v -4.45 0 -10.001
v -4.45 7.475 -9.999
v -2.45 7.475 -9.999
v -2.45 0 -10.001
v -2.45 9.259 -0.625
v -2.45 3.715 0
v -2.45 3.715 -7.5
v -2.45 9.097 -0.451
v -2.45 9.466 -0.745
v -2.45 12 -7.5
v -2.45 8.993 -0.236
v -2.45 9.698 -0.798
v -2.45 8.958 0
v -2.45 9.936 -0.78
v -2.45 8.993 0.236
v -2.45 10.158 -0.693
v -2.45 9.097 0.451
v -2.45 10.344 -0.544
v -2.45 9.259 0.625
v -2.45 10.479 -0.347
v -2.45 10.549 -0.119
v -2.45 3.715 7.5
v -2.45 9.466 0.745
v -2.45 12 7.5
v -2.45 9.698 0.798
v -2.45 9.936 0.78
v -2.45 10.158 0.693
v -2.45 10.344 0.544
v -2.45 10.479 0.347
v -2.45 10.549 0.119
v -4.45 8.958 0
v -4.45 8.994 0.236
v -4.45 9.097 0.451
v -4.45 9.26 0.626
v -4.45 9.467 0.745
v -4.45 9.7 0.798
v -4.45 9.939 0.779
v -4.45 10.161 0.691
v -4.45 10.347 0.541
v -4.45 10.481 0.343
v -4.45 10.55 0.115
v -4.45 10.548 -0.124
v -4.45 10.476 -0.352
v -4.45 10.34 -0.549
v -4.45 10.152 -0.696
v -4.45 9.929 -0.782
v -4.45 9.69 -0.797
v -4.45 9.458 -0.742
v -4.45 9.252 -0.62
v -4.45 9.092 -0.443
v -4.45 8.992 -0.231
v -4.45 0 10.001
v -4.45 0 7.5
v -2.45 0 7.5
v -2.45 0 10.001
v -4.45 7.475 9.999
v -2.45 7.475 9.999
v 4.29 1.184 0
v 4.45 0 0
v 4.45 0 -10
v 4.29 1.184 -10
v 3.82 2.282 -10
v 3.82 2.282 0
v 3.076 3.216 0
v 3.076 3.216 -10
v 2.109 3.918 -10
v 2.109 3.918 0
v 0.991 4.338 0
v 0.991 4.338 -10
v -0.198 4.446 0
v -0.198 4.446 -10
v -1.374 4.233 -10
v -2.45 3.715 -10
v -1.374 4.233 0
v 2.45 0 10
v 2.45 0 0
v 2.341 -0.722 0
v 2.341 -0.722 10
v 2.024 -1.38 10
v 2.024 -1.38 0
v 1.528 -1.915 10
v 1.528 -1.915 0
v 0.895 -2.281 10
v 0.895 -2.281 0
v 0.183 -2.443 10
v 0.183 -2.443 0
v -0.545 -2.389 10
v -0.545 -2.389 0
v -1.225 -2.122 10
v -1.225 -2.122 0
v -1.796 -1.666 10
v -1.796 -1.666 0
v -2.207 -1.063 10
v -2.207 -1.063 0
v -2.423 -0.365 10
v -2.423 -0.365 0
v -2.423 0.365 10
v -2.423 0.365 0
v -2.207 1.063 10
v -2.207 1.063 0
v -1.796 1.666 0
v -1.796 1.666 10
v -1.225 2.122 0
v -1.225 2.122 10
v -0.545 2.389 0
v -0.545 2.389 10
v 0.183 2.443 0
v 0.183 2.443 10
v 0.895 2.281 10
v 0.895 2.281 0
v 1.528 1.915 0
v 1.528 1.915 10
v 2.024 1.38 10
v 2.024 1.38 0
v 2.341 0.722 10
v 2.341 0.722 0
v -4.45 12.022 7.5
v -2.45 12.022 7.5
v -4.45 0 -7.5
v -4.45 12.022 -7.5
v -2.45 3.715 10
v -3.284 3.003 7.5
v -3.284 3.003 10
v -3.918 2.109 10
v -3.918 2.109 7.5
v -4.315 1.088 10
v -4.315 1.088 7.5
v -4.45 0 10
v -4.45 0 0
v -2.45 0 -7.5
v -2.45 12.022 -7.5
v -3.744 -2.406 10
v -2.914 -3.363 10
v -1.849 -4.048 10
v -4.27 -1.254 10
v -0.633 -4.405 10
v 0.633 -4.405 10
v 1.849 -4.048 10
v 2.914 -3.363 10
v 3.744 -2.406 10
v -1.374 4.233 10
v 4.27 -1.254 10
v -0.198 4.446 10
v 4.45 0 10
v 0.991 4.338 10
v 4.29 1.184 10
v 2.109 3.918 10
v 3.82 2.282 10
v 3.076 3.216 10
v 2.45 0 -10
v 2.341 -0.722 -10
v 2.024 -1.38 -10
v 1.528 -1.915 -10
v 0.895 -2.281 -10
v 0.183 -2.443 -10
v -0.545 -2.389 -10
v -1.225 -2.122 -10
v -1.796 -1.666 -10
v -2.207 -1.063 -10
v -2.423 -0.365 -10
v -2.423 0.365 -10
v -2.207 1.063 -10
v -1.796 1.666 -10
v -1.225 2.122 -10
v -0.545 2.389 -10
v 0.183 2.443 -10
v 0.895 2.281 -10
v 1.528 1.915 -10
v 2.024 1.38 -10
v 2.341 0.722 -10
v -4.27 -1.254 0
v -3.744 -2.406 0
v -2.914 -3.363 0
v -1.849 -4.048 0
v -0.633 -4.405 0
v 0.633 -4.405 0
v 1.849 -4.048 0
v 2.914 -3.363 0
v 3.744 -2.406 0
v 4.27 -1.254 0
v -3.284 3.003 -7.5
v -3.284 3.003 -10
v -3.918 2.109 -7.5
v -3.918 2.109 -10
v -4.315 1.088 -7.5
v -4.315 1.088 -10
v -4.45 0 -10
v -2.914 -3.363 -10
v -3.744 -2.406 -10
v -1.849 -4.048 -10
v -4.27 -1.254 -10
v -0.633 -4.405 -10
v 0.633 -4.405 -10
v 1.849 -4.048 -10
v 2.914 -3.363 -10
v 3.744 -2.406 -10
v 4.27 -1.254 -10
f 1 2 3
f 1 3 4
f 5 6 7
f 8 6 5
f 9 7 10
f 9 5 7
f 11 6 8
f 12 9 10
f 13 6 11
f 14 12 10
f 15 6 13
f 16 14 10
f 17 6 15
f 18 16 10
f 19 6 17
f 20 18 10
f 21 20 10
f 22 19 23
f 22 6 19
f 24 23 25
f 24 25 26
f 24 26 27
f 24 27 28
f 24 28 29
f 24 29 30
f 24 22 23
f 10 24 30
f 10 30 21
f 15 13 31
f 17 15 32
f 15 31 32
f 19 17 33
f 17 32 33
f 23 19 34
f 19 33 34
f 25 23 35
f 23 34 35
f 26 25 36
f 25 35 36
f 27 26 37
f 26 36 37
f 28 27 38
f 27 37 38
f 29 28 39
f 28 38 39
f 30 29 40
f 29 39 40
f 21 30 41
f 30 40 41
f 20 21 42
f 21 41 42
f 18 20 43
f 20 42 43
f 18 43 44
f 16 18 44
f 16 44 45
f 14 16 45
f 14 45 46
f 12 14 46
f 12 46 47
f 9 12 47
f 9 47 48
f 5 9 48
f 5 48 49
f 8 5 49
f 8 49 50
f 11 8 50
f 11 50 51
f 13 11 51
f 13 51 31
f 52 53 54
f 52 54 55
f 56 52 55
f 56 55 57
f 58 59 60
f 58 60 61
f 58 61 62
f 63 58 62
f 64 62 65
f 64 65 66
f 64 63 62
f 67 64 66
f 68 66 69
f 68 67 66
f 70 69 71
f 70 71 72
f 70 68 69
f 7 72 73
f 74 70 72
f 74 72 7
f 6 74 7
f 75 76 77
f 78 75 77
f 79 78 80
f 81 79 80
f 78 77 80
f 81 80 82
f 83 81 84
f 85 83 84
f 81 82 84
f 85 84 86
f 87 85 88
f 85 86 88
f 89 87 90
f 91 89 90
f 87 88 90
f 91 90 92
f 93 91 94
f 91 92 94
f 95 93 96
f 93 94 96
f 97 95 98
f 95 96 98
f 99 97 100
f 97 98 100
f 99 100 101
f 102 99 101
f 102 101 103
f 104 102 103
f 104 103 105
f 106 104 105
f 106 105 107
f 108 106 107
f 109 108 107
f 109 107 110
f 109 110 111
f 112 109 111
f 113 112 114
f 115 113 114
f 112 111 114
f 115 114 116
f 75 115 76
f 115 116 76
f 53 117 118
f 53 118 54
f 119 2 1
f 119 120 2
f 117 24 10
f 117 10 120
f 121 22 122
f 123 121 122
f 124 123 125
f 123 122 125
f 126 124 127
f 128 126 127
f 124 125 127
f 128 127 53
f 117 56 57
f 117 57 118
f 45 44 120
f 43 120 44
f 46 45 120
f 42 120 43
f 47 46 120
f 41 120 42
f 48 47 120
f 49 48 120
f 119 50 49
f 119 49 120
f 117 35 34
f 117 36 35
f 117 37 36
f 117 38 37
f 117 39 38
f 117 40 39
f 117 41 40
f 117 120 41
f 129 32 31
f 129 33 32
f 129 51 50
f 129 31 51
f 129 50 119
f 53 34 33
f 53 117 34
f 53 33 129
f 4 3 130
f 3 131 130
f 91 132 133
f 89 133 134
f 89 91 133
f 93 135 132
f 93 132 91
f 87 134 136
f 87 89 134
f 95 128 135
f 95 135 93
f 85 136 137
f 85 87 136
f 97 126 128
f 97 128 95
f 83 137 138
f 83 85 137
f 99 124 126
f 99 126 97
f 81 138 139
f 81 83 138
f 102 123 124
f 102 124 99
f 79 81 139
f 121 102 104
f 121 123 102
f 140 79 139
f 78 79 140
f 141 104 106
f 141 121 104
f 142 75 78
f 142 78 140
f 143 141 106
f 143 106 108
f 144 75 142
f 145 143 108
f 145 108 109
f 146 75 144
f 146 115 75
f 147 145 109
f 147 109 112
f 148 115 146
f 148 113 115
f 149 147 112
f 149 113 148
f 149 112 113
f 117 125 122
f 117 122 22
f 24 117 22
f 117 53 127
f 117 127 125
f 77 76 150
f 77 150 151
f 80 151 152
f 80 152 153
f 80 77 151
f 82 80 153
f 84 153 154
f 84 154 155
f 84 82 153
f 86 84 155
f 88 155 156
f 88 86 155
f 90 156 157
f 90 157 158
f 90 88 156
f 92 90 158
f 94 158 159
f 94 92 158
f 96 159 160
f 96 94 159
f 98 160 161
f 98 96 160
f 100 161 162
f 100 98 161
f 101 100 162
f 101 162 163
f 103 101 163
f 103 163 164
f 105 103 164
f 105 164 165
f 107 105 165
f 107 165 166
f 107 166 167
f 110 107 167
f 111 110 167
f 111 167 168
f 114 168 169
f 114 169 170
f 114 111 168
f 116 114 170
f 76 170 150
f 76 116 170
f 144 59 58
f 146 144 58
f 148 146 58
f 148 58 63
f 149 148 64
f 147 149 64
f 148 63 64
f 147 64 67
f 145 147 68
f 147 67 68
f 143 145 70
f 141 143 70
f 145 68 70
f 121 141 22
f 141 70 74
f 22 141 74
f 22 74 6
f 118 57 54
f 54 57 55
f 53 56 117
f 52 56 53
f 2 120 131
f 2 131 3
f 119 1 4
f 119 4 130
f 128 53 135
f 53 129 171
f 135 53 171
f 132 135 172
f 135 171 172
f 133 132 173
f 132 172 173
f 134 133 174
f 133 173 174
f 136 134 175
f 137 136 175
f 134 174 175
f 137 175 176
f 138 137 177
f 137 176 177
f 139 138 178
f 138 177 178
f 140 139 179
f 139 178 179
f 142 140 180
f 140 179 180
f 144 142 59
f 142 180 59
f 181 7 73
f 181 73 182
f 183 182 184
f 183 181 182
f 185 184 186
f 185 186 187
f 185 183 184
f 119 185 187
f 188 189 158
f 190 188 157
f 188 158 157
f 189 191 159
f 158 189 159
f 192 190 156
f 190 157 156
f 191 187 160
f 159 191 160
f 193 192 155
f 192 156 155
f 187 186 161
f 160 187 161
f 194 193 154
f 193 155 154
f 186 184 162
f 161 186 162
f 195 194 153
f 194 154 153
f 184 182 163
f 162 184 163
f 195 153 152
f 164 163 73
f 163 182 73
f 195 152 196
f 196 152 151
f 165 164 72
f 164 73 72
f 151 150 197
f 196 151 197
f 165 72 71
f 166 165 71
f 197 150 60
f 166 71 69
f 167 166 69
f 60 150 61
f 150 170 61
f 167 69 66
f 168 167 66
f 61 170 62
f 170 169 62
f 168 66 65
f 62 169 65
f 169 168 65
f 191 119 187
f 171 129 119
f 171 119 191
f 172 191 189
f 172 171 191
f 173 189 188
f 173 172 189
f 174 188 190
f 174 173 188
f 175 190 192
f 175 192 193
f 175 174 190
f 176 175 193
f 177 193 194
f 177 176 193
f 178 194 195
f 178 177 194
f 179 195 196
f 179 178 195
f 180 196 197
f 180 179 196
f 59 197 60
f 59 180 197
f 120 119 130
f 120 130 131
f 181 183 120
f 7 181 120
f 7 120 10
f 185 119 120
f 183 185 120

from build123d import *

# Parameters (mm, degrees)
F1_DEPTH = 7.5
F2_DEPTH = 10
F4_D     = 1.6
F4_DEPTH = 20
F4_TIP   = 0.4806884952
F6_DEPTH = 2


with BuildPart() as f1:
    # F0 (on Top) → F1 (new body, symmetric)
    with BuildSketch(Plane.XY):
        with BuildLine():
            ThreePointArc((-4.45, 0), (-3.9182373637, 2.109482392), (-2.4500377699, 3.714810214))
            Line((-2.4500377699, 3.714810214), (-2.4501220086, 11.9999999994))
            Line((-2.4501220086, 11.9999999994), (-4.45, 12.0220911662))
            Line((-4.45, 12.0220911662), (-4.45, 0))
        make_face()
    extrude(amount=F1_DEPTH, both=True)

    # F0 (on Top) → F2 (join, symmetric)
    with BuildSketch(Plane.XY):
        with BuildLine():
            ThreePointArc((4.45, 0), (2.109482392, 3.9182373637), (-2.4500377699, 3.714810214))
            ThreePointArc((-2.4500377699, 3.714810214), (-3.9182373637, 2.109482392), (-4.45, 0))
            ThreePointArc((-4.45, 0), (0, -4.45), (4.45, 0))
        make_face()
        with BuildLine():
            ThreePointArc((-2.45, 0), (0, 2.45), (2.45, 0))
            ThreePointArc((2.45, 0), (0, -2.45), (-2.45, 0))
        make_face(mode=Mode.SUBTRACT)
    extrude(amount=F2_DEPTH, both=True)

    # F4
    with Locations(Plane(origin=(-2.4499999997, -2.49101e-05, 0), x_dir=(-1.01674e-05, 0.9999999999, 0), z_dir=(0.9999999999, 1.01674e-05, 0))):
        with Locations((9.7579266876, 0)):
            Hole(F4_D / 2, depth=F4_DEPTH)
            with Locations((0, 0, -(F4_DEPTH + F4_TIP / 2))):  # 118° drill point
                Cone(0, F4_D / 2, F4_TIP, mode=Mode.SUBTRACT)


with BuildPart() as f6:
    # F5 (on face) → F6 (new body)
    with BuildSketch(Plane(origin=(-4.45, 0, 0), x_dir=(0, -1, 0), z_dir=(-1, 0, 0))):
        Polygon((0, -9.9865663797), (0, -7.5), (-12.0220911662, -7.5), (-7.4750312432, -9.9994977936), (0, -10.0010894239), align=None)
    extrude(amount=-F6_DEPTH)


with BuildPart() as f6b:
    # F5 (on face) → F6, piece 2 (new body)
    with BuildSketch(Plane(origin=(-4.45, 0, 0), x_dir=(0, -1, 0), z_dir=(-1, 0, 0))):
        Polygon((0, 7.5), (0, 9.9865663797), (0, 10.0010894239), (-7.4750312432, 9.9994977936), (-12.0220911662, 7.5), align=None)
    extrude(amount=-F6_DEPTH)


solid = Compound([f1.part, f6.part, f6b.part])
